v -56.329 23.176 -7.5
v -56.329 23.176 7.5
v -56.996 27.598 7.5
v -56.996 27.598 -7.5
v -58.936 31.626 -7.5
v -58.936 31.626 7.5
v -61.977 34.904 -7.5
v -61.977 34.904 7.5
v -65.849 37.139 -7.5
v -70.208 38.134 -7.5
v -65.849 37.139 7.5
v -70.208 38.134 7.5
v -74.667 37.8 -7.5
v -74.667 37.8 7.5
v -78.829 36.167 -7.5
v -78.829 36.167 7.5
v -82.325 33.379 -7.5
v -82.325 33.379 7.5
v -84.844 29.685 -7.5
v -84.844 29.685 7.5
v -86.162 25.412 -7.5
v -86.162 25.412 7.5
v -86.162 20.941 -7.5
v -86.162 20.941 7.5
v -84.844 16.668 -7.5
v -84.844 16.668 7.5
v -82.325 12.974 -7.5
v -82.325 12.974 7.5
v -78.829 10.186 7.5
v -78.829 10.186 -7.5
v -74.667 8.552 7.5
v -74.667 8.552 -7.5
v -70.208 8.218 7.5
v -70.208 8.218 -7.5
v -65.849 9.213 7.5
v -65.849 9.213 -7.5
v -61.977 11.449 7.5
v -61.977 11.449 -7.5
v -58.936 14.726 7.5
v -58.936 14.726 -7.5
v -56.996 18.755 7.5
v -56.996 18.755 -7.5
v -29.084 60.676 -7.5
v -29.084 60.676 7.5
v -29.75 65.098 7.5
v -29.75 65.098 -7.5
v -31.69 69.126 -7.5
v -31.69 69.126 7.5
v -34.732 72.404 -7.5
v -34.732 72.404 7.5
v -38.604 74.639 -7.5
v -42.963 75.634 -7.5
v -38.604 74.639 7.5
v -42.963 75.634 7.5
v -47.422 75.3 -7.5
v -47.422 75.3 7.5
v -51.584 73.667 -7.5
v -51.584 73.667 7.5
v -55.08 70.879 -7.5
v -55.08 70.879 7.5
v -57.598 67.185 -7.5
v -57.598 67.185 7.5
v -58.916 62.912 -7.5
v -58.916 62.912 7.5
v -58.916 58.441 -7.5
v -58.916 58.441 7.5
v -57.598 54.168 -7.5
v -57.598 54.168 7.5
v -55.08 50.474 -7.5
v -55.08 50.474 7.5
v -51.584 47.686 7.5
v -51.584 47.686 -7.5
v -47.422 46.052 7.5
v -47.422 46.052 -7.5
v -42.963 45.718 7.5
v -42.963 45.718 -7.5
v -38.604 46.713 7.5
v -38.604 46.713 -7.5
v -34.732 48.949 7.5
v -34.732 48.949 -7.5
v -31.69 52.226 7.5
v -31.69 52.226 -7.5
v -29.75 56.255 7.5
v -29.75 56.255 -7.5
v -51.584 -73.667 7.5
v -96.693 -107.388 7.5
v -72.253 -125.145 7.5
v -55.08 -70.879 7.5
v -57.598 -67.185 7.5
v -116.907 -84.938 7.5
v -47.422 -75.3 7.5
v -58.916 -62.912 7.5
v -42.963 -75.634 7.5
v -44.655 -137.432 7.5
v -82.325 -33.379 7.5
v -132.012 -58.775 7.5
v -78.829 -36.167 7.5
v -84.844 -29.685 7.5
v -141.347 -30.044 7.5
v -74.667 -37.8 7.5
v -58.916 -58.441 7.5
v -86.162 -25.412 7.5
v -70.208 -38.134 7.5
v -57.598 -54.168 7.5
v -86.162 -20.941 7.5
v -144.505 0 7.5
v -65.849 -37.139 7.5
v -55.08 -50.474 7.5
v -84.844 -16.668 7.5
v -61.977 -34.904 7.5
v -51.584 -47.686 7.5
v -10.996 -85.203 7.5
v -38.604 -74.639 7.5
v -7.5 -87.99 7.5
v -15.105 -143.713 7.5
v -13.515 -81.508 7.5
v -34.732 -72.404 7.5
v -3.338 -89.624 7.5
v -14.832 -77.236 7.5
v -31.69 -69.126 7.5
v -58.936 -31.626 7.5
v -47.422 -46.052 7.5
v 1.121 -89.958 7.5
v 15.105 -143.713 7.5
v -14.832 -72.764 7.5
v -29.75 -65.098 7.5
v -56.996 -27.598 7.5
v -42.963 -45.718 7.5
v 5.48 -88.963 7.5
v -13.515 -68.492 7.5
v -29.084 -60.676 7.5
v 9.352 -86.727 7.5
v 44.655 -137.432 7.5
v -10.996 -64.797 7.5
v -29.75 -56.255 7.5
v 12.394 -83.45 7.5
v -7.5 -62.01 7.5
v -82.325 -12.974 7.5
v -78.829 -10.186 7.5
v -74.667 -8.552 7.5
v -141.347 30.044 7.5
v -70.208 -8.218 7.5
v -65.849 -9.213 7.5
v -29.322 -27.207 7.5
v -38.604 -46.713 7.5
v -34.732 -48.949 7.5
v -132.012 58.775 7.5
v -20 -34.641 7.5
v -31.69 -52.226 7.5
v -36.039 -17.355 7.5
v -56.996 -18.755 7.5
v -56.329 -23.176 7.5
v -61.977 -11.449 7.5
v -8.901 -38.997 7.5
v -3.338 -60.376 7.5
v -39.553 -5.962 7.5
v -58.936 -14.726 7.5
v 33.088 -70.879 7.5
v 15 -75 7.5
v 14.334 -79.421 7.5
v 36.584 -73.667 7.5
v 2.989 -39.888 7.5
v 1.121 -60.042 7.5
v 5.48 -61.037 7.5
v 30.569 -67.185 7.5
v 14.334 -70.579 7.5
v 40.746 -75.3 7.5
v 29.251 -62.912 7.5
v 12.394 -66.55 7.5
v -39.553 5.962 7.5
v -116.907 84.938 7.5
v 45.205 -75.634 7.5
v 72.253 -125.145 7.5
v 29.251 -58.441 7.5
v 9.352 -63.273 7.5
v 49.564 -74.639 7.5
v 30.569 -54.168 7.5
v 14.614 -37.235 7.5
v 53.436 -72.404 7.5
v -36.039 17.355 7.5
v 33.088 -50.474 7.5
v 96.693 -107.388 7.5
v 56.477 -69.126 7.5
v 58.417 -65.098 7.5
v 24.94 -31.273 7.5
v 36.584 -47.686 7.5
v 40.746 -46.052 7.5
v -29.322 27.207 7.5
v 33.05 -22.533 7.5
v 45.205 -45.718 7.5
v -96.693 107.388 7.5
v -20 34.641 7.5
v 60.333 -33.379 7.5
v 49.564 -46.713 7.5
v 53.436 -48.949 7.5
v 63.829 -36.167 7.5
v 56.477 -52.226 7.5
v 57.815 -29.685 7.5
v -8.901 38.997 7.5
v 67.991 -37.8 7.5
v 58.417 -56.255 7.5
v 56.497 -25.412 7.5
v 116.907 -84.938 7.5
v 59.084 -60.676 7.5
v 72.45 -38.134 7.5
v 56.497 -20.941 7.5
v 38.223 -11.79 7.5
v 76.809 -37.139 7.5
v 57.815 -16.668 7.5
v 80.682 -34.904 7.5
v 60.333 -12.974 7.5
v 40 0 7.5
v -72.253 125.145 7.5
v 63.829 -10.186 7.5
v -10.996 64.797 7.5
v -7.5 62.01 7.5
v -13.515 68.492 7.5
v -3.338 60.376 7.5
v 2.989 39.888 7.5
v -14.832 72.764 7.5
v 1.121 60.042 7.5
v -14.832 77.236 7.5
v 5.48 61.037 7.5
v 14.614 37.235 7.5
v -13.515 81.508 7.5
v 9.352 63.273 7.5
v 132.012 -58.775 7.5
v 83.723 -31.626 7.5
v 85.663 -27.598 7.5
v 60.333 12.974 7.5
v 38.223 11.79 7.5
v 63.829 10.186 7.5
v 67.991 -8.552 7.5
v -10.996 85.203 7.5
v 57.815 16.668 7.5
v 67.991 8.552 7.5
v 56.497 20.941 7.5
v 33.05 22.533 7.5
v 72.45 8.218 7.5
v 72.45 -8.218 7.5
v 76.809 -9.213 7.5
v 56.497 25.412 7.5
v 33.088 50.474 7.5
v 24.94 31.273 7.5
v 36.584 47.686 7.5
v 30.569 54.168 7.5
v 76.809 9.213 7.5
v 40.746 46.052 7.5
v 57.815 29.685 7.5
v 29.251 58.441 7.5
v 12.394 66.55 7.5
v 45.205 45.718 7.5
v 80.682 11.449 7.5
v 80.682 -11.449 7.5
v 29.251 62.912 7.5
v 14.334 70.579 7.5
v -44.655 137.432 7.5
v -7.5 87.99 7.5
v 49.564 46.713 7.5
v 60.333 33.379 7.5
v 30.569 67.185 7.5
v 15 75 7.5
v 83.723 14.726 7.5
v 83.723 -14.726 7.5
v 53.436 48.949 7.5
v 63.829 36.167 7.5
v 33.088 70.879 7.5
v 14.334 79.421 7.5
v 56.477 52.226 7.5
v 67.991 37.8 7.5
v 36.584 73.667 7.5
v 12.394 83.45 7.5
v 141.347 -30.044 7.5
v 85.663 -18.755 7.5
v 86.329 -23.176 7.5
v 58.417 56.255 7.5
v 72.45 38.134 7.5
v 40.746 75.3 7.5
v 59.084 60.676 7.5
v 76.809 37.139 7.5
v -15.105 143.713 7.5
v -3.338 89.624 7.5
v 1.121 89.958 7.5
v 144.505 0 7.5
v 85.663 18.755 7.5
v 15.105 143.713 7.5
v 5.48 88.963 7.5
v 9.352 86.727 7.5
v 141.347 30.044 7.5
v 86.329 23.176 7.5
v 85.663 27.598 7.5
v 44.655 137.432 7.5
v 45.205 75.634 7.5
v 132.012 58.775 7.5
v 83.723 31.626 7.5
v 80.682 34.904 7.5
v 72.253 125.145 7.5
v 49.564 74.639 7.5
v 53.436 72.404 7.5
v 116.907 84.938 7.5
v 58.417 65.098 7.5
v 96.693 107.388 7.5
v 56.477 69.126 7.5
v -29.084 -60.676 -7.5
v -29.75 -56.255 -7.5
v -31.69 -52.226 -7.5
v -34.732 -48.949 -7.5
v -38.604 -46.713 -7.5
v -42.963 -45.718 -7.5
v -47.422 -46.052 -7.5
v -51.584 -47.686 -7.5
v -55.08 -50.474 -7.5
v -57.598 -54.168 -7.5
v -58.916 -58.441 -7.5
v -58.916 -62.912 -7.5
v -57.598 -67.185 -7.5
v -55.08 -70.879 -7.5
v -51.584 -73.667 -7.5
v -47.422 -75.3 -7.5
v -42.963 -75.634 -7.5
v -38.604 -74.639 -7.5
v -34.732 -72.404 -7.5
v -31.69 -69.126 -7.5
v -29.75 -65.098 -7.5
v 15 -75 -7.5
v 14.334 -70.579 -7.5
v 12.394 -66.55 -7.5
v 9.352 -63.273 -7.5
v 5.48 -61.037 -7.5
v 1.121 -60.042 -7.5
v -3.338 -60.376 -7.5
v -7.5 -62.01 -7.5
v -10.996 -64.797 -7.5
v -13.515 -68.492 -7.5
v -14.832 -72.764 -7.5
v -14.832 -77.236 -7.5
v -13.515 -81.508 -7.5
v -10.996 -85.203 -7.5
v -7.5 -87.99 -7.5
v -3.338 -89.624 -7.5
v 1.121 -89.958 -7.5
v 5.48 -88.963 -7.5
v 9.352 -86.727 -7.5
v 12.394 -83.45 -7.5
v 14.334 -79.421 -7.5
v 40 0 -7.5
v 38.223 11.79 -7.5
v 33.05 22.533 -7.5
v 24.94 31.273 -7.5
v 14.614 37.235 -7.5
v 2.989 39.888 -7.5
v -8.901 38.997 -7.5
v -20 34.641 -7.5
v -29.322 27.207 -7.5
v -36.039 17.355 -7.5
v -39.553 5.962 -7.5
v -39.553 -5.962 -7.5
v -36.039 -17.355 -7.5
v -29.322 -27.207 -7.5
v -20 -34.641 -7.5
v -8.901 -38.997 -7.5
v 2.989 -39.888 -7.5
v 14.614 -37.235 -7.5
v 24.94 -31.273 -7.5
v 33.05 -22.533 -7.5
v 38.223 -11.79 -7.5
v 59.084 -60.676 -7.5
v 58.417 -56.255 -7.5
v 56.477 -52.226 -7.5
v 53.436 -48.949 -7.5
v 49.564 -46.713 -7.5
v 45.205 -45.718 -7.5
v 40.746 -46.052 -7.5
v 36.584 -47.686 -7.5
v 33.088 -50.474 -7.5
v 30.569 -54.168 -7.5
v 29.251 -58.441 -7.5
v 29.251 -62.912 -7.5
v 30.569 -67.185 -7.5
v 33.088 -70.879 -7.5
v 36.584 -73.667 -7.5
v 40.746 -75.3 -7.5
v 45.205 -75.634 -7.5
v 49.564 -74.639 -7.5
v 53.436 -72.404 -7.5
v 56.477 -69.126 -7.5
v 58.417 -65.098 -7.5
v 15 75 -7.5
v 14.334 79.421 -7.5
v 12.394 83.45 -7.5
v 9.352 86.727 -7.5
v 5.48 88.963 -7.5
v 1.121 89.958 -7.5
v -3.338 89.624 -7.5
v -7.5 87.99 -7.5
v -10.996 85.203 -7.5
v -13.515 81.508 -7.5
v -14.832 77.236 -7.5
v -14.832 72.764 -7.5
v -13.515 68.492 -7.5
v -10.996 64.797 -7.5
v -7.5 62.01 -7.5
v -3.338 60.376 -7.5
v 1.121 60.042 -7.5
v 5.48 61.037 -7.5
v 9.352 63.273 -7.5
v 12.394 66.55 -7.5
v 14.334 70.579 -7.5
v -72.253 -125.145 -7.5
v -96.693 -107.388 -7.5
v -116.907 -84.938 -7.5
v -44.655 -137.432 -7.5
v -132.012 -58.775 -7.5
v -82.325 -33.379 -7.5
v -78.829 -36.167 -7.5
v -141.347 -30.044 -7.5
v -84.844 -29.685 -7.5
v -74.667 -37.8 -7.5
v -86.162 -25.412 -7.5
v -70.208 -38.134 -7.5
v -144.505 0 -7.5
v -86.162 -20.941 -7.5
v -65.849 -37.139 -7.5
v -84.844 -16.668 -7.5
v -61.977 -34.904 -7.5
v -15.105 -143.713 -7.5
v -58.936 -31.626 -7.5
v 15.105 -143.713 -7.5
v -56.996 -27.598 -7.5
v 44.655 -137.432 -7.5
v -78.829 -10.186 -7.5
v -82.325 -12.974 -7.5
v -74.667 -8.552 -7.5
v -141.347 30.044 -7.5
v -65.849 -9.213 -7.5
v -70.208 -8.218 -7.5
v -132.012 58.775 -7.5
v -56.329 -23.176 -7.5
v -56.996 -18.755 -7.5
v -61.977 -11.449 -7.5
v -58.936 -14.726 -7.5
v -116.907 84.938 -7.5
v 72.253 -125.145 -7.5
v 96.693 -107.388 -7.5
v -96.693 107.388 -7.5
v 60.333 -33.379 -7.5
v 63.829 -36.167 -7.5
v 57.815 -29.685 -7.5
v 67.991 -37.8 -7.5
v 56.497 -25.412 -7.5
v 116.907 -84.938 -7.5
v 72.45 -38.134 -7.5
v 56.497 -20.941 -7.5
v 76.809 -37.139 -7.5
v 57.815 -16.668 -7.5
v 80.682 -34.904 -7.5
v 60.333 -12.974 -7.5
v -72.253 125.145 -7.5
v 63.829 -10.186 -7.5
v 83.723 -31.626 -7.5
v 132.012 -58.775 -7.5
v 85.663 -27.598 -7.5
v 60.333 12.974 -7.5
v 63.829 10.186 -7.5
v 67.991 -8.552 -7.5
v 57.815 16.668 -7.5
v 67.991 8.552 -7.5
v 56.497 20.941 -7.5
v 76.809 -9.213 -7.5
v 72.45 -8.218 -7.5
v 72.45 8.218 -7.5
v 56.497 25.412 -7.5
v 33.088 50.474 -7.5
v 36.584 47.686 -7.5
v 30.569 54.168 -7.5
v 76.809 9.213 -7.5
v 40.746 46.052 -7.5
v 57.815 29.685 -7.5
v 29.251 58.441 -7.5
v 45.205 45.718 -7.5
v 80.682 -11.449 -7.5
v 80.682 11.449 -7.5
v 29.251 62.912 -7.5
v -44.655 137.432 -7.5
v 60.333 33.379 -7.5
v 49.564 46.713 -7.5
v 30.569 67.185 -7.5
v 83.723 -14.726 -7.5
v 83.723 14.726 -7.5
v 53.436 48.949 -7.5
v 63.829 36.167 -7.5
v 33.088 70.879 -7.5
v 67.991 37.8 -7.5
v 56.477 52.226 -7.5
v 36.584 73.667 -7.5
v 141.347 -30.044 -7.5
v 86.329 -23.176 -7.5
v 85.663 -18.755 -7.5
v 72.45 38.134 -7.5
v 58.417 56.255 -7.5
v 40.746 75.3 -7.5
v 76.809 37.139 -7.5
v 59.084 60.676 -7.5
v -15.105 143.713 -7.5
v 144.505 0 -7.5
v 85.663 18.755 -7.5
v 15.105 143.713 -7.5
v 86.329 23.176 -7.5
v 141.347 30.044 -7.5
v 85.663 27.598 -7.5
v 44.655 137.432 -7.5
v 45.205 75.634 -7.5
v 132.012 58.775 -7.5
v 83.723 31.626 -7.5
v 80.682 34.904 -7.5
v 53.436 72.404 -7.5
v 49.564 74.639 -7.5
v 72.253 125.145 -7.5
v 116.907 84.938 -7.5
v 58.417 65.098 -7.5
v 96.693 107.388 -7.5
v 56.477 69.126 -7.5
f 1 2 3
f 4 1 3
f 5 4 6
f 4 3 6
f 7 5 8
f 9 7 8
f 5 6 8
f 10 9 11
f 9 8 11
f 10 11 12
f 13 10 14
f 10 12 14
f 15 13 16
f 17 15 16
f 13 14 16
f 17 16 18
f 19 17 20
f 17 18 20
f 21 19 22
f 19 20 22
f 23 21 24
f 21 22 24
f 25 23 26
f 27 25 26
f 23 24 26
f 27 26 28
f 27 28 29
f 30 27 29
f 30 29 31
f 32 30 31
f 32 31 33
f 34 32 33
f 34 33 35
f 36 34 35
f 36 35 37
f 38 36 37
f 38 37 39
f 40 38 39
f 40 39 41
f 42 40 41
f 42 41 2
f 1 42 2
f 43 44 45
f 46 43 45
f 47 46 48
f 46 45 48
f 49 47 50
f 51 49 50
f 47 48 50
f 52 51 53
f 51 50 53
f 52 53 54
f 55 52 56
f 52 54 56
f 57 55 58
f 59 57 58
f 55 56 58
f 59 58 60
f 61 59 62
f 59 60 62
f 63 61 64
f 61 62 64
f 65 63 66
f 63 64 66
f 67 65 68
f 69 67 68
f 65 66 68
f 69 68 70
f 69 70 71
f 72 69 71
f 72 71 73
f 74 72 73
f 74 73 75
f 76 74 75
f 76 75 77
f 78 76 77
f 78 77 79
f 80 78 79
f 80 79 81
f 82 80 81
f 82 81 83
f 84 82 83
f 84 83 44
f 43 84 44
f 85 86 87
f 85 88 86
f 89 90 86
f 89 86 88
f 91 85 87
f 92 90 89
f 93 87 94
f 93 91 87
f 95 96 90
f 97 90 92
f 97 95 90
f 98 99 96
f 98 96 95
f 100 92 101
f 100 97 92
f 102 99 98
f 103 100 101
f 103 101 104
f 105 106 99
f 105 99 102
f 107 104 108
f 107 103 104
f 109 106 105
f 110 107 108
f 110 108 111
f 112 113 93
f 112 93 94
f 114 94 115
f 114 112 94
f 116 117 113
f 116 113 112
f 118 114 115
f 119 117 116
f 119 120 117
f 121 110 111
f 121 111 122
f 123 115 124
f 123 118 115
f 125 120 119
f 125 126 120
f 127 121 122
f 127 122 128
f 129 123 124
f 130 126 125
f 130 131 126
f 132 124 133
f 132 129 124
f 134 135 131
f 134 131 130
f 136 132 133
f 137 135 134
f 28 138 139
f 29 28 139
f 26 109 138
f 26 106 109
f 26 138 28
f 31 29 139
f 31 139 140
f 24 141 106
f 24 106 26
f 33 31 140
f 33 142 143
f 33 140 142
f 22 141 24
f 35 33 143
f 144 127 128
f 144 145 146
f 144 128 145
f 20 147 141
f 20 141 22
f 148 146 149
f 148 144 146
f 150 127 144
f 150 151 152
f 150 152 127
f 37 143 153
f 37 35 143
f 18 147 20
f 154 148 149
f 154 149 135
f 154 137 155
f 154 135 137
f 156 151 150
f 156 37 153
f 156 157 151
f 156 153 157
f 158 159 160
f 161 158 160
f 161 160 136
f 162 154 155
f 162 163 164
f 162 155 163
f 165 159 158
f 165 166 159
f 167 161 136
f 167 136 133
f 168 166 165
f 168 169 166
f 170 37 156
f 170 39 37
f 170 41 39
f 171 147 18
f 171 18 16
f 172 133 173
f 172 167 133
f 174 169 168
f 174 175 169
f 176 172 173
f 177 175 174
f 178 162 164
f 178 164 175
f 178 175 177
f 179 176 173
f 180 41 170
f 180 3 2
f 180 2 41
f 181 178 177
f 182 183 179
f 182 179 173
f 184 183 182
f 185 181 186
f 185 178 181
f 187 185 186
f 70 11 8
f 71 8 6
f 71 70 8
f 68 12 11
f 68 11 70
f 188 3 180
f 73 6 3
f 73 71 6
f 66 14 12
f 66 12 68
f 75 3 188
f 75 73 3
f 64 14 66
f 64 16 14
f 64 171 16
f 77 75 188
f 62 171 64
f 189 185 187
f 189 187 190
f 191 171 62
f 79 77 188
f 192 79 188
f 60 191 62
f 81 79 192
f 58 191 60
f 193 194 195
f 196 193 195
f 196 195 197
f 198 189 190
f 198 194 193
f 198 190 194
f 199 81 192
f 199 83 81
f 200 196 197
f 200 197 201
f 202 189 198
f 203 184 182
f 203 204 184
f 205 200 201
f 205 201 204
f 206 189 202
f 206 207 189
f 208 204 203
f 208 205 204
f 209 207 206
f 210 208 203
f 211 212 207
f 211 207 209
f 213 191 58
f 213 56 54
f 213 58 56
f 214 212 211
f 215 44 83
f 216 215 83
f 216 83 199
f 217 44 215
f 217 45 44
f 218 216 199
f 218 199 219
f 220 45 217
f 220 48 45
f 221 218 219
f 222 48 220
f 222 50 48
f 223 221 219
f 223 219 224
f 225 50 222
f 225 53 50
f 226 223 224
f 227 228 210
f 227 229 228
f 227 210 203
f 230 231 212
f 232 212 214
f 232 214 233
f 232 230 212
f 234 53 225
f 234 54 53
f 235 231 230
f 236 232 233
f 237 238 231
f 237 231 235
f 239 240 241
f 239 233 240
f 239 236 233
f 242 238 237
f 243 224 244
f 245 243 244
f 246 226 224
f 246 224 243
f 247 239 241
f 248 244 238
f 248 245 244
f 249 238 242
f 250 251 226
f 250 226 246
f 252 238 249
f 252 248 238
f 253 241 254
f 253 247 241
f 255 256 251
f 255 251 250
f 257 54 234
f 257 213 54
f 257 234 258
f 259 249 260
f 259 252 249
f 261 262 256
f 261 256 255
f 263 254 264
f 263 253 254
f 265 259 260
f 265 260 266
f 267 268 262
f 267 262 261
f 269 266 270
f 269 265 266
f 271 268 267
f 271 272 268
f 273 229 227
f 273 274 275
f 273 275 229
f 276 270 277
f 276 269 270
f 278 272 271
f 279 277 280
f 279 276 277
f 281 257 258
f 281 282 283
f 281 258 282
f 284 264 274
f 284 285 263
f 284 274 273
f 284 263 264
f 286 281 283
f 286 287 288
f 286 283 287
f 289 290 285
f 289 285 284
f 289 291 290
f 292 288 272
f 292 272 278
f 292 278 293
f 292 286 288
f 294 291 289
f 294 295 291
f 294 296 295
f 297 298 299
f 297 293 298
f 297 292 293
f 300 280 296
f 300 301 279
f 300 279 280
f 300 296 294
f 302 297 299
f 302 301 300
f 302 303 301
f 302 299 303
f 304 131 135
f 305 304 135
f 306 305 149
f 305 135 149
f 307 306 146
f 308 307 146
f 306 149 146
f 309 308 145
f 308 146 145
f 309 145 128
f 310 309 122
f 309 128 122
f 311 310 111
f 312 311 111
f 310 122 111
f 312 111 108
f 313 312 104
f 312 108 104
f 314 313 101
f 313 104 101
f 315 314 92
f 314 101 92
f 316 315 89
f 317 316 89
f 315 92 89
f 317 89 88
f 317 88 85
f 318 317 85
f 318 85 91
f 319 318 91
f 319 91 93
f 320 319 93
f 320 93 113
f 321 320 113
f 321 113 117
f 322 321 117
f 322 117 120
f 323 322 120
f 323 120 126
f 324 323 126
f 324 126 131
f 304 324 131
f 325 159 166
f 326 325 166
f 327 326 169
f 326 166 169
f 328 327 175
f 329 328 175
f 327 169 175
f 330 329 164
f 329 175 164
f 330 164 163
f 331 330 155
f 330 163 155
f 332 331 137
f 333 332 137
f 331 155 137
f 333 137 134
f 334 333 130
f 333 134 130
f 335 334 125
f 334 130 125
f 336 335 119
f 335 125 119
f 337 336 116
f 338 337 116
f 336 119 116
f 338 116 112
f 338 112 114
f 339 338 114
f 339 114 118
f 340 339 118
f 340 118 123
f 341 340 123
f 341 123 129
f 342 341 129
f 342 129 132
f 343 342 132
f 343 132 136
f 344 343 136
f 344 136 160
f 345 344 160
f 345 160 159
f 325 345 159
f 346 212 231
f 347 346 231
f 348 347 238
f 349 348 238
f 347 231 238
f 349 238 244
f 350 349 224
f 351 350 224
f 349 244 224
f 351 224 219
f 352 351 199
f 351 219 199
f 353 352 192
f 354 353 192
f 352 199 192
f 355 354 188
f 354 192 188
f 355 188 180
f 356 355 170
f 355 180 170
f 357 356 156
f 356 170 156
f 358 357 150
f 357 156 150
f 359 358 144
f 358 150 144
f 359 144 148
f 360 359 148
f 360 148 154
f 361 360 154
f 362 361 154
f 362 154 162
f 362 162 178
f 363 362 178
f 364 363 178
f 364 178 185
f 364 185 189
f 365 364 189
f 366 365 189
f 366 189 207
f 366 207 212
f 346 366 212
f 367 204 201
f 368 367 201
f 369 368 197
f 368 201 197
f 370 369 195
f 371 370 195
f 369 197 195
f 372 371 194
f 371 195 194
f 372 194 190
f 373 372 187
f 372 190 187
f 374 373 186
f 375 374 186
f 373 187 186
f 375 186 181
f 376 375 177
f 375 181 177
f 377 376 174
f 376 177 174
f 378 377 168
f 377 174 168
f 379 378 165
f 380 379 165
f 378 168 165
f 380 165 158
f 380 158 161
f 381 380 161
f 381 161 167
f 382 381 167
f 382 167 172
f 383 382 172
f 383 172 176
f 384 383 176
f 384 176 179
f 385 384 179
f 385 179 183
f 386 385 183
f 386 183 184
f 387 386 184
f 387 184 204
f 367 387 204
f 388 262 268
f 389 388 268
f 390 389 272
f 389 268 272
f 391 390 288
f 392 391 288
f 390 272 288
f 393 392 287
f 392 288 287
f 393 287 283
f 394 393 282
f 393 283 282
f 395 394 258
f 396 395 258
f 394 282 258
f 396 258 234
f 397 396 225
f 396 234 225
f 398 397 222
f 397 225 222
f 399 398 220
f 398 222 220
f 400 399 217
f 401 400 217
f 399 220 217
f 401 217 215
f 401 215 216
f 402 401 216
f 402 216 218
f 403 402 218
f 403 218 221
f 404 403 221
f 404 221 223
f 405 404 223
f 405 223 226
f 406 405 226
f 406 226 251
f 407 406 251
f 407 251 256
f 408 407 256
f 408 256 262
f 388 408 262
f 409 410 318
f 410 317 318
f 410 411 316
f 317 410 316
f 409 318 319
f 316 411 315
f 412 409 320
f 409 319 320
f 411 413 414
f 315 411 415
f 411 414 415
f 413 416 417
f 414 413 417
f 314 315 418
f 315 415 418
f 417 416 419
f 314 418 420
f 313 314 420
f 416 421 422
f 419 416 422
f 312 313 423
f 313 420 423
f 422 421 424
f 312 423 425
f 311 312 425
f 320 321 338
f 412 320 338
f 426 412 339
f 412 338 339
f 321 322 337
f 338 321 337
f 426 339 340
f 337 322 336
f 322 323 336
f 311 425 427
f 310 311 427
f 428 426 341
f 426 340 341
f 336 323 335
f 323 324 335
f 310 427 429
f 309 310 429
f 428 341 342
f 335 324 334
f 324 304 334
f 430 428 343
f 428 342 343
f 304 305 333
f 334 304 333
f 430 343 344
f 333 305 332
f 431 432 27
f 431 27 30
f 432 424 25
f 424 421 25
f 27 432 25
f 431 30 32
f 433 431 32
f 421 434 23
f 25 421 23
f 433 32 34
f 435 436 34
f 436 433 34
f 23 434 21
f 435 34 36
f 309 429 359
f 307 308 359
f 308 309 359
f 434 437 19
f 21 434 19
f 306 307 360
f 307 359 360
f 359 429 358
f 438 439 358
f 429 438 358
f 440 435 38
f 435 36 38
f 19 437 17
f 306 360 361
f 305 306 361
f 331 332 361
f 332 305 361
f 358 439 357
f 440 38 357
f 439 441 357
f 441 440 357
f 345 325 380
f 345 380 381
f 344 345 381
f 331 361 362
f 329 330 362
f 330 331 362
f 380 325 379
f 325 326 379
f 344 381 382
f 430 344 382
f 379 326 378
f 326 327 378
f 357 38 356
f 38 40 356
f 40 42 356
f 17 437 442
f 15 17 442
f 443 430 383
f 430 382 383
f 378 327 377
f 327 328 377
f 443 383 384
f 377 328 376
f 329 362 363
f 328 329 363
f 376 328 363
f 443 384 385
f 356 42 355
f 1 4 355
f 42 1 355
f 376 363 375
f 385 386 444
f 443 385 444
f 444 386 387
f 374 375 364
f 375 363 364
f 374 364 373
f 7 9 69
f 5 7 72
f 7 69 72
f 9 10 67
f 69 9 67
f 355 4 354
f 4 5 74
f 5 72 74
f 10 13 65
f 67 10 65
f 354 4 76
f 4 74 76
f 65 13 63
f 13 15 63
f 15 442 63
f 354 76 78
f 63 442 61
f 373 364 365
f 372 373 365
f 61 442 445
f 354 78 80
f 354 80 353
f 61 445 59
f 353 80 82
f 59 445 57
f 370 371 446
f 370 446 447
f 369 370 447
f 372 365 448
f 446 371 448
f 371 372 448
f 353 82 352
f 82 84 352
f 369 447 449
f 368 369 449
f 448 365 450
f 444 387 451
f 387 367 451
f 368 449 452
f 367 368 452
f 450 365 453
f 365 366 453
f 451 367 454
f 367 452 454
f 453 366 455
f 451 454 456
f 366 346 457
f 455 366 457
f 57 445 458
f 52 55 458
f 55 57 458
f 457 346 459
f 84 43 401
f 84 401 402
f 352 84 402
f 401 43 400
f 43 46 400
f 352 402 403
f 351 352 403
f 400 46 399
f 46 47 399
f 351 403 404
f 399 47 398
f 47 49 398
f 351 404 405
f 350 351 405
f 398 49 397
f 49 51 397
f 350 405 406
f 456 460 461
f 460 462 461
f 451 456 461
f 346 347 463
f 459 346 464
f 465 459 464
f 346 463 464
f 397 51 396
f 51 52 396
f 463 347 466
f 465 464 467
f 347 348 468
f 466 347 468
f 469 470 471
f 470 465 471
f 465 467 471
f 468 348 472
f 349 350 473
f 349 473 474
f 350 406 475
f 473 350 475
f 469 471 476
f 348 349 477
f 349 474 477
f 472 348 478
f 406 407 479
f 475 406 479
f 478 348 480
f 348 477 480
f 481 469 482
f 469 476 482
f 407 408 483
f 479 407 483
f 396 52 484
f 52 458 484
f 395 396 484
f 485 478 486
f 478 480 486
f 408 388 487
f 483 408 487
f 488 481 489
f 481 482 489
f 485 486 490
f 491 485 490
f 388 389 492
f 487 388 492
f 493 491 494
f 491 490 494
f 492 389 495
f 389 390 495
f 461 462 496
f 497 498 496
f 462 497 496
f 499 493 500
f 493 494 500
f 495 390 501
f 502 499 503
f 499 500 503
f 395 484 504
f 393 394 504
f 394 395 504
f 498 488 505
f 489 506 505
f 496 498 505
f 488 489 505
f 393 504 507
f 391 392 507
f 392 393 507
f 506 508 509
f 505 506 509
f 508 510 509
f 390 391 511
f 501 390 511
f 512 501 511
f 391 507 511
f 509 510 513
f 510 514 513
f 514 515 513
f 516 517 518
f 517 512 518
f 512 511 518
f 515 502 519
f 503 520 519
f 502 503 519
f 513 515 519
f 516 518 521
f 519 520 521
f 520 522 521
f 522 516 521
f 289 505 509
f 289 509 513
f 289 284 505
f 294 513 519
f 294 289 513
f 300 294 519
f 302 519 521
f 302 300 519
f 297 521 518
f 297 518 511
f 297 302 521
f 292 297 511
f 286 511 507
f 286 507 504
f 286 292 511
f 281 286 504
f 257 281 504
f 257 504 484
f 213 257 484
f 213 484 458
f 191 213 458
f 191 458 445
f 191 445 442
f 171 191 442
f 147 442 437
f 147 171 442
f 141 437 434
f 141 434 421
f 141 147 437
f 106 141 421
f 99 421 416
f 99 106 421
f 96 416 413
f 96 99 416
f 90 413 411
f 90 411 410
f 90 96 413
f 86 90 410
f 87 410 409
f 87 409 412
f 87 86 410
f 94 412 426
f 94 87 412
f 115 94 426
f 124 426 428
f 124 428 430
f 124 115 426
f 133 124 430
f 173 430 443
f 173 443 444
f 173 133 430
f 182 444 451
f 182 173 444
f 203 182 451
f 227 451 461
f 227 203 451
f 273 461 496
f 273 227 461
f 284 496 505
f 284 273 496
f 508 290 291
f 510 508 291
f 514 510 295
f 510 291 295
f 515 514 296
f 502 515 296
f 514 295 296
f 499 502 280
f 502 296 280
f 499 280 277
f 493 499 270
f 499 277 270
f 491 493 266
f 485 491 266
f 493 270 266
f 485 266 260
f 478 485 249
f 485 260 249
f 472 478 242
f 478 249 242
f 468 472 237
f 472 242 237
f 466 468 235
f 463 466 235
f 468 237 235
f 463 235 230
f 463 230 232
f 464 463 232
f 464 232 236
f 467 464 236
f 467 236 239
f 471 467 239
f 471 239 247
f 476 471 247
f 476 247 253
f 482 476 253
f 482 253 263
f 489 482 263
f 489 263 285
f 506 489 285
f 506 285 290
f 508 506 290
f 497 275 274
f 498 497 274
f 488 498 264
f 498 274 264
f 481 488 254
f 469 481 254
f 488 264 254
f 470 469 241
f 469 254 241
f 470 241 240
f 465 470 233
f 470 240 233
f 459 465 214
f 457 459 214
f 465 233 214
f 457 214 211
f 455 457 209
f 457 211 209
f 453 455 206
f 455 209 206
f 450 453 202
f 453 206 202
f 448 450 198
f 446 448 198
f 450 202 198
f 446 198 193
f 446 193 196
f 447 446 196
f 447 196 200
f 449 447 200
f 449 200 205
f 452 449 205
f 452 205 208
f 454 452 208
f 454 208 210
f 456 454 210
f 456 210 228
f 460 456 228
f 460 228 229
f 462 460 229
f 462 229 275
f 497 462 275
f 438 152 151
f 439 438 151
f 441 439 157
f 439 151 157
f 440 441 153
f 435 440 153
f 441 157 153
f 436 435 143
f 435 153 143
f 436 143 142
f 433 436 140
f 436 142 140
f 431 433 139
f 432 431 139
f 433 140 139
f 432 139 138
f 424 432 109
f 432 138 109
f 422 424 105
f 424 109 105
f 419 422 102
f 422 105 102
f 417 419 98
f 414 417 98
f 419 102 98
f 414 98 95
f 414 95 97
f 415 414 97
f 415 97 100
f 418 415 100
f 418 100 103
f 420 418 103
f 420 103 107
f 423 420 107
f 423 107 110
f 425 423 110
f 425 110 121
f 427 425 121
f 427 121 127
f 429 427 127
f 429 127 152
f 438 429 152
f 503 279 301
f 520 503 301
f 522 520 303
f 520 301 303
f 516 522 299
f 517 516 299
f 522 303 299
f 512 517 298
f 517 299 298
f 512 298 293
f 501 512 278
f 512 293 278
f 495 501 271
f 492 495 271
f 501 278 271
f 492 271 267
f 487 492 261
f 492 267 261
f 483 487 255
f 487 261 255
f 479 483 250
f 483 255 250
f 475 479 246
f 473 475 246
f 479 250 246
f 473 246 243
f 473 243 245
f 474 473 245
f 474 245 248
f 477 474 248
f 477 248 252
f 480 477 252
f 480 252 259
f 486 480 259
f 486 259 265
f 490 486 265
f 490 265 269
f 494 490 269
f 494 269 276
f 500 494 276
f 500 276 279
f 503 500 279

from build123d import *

# Parameters (mm, degrees)
SKETCH2_R           = 144.505
BOSS_EXTRUDE1_DEPTH = 7.5
SKETCH3_R           = 40
SKETCH3_R_2         = 15
CUT_EXTRUDE1_DEPTH  = 16


with BuildPart() as part:
    # Sketch2 → Boss-Extrude1 (new body, symmetric)
    with BuildSketch(Plane.XY):
        Circle(SKETCH2_R)
    extrude(amount=BOSS_EXTRUDE1_DEPTH, both=True)

    # Sketch3 → Cut-Extrude1 (cut, through all)
    with BuildSketch(Plane.XY.offset(7.5)):
        Circle(SKETCH3_R)
        with Locations((0, 75)):
            Circle(SKETCH3_R_2)
        with Locations((44.083893922, 60.676274578)):
            Circle(SKETCH3_R_2)
        with Locations((71.329238722, 23.176274578)):
            Circle(SKETCH3_R_2)
        with Locations((71.329238722, -23.176274578)):
            Circle(SKETCH3_R_2)
        with Locations((44.083893922, -60.676274578)):
            Circle(SKETCH3_R_2)
        with Locations((0, -75)):
            Circle(SKETCH3_R_2)
        with Locations((-44.083893922, -60.676274578)):
            Circle(SKETCH3_R_2)
        with Locations((-71.329238722, -23.176274578)):
            Circle(SKETCH3_R_2)
        with Locations((-71.329238722, 23.176274578)):
            Circle(SKETCH3_R_2)
        with Locations((-44.083893922, 60.676274578)):
            Circle(SKETCH3_R_2)
    extrude(amount=-CUT_EXTRUDE1_DEPTH, mode=Mode.SUBTRACT)


solid = part.part
